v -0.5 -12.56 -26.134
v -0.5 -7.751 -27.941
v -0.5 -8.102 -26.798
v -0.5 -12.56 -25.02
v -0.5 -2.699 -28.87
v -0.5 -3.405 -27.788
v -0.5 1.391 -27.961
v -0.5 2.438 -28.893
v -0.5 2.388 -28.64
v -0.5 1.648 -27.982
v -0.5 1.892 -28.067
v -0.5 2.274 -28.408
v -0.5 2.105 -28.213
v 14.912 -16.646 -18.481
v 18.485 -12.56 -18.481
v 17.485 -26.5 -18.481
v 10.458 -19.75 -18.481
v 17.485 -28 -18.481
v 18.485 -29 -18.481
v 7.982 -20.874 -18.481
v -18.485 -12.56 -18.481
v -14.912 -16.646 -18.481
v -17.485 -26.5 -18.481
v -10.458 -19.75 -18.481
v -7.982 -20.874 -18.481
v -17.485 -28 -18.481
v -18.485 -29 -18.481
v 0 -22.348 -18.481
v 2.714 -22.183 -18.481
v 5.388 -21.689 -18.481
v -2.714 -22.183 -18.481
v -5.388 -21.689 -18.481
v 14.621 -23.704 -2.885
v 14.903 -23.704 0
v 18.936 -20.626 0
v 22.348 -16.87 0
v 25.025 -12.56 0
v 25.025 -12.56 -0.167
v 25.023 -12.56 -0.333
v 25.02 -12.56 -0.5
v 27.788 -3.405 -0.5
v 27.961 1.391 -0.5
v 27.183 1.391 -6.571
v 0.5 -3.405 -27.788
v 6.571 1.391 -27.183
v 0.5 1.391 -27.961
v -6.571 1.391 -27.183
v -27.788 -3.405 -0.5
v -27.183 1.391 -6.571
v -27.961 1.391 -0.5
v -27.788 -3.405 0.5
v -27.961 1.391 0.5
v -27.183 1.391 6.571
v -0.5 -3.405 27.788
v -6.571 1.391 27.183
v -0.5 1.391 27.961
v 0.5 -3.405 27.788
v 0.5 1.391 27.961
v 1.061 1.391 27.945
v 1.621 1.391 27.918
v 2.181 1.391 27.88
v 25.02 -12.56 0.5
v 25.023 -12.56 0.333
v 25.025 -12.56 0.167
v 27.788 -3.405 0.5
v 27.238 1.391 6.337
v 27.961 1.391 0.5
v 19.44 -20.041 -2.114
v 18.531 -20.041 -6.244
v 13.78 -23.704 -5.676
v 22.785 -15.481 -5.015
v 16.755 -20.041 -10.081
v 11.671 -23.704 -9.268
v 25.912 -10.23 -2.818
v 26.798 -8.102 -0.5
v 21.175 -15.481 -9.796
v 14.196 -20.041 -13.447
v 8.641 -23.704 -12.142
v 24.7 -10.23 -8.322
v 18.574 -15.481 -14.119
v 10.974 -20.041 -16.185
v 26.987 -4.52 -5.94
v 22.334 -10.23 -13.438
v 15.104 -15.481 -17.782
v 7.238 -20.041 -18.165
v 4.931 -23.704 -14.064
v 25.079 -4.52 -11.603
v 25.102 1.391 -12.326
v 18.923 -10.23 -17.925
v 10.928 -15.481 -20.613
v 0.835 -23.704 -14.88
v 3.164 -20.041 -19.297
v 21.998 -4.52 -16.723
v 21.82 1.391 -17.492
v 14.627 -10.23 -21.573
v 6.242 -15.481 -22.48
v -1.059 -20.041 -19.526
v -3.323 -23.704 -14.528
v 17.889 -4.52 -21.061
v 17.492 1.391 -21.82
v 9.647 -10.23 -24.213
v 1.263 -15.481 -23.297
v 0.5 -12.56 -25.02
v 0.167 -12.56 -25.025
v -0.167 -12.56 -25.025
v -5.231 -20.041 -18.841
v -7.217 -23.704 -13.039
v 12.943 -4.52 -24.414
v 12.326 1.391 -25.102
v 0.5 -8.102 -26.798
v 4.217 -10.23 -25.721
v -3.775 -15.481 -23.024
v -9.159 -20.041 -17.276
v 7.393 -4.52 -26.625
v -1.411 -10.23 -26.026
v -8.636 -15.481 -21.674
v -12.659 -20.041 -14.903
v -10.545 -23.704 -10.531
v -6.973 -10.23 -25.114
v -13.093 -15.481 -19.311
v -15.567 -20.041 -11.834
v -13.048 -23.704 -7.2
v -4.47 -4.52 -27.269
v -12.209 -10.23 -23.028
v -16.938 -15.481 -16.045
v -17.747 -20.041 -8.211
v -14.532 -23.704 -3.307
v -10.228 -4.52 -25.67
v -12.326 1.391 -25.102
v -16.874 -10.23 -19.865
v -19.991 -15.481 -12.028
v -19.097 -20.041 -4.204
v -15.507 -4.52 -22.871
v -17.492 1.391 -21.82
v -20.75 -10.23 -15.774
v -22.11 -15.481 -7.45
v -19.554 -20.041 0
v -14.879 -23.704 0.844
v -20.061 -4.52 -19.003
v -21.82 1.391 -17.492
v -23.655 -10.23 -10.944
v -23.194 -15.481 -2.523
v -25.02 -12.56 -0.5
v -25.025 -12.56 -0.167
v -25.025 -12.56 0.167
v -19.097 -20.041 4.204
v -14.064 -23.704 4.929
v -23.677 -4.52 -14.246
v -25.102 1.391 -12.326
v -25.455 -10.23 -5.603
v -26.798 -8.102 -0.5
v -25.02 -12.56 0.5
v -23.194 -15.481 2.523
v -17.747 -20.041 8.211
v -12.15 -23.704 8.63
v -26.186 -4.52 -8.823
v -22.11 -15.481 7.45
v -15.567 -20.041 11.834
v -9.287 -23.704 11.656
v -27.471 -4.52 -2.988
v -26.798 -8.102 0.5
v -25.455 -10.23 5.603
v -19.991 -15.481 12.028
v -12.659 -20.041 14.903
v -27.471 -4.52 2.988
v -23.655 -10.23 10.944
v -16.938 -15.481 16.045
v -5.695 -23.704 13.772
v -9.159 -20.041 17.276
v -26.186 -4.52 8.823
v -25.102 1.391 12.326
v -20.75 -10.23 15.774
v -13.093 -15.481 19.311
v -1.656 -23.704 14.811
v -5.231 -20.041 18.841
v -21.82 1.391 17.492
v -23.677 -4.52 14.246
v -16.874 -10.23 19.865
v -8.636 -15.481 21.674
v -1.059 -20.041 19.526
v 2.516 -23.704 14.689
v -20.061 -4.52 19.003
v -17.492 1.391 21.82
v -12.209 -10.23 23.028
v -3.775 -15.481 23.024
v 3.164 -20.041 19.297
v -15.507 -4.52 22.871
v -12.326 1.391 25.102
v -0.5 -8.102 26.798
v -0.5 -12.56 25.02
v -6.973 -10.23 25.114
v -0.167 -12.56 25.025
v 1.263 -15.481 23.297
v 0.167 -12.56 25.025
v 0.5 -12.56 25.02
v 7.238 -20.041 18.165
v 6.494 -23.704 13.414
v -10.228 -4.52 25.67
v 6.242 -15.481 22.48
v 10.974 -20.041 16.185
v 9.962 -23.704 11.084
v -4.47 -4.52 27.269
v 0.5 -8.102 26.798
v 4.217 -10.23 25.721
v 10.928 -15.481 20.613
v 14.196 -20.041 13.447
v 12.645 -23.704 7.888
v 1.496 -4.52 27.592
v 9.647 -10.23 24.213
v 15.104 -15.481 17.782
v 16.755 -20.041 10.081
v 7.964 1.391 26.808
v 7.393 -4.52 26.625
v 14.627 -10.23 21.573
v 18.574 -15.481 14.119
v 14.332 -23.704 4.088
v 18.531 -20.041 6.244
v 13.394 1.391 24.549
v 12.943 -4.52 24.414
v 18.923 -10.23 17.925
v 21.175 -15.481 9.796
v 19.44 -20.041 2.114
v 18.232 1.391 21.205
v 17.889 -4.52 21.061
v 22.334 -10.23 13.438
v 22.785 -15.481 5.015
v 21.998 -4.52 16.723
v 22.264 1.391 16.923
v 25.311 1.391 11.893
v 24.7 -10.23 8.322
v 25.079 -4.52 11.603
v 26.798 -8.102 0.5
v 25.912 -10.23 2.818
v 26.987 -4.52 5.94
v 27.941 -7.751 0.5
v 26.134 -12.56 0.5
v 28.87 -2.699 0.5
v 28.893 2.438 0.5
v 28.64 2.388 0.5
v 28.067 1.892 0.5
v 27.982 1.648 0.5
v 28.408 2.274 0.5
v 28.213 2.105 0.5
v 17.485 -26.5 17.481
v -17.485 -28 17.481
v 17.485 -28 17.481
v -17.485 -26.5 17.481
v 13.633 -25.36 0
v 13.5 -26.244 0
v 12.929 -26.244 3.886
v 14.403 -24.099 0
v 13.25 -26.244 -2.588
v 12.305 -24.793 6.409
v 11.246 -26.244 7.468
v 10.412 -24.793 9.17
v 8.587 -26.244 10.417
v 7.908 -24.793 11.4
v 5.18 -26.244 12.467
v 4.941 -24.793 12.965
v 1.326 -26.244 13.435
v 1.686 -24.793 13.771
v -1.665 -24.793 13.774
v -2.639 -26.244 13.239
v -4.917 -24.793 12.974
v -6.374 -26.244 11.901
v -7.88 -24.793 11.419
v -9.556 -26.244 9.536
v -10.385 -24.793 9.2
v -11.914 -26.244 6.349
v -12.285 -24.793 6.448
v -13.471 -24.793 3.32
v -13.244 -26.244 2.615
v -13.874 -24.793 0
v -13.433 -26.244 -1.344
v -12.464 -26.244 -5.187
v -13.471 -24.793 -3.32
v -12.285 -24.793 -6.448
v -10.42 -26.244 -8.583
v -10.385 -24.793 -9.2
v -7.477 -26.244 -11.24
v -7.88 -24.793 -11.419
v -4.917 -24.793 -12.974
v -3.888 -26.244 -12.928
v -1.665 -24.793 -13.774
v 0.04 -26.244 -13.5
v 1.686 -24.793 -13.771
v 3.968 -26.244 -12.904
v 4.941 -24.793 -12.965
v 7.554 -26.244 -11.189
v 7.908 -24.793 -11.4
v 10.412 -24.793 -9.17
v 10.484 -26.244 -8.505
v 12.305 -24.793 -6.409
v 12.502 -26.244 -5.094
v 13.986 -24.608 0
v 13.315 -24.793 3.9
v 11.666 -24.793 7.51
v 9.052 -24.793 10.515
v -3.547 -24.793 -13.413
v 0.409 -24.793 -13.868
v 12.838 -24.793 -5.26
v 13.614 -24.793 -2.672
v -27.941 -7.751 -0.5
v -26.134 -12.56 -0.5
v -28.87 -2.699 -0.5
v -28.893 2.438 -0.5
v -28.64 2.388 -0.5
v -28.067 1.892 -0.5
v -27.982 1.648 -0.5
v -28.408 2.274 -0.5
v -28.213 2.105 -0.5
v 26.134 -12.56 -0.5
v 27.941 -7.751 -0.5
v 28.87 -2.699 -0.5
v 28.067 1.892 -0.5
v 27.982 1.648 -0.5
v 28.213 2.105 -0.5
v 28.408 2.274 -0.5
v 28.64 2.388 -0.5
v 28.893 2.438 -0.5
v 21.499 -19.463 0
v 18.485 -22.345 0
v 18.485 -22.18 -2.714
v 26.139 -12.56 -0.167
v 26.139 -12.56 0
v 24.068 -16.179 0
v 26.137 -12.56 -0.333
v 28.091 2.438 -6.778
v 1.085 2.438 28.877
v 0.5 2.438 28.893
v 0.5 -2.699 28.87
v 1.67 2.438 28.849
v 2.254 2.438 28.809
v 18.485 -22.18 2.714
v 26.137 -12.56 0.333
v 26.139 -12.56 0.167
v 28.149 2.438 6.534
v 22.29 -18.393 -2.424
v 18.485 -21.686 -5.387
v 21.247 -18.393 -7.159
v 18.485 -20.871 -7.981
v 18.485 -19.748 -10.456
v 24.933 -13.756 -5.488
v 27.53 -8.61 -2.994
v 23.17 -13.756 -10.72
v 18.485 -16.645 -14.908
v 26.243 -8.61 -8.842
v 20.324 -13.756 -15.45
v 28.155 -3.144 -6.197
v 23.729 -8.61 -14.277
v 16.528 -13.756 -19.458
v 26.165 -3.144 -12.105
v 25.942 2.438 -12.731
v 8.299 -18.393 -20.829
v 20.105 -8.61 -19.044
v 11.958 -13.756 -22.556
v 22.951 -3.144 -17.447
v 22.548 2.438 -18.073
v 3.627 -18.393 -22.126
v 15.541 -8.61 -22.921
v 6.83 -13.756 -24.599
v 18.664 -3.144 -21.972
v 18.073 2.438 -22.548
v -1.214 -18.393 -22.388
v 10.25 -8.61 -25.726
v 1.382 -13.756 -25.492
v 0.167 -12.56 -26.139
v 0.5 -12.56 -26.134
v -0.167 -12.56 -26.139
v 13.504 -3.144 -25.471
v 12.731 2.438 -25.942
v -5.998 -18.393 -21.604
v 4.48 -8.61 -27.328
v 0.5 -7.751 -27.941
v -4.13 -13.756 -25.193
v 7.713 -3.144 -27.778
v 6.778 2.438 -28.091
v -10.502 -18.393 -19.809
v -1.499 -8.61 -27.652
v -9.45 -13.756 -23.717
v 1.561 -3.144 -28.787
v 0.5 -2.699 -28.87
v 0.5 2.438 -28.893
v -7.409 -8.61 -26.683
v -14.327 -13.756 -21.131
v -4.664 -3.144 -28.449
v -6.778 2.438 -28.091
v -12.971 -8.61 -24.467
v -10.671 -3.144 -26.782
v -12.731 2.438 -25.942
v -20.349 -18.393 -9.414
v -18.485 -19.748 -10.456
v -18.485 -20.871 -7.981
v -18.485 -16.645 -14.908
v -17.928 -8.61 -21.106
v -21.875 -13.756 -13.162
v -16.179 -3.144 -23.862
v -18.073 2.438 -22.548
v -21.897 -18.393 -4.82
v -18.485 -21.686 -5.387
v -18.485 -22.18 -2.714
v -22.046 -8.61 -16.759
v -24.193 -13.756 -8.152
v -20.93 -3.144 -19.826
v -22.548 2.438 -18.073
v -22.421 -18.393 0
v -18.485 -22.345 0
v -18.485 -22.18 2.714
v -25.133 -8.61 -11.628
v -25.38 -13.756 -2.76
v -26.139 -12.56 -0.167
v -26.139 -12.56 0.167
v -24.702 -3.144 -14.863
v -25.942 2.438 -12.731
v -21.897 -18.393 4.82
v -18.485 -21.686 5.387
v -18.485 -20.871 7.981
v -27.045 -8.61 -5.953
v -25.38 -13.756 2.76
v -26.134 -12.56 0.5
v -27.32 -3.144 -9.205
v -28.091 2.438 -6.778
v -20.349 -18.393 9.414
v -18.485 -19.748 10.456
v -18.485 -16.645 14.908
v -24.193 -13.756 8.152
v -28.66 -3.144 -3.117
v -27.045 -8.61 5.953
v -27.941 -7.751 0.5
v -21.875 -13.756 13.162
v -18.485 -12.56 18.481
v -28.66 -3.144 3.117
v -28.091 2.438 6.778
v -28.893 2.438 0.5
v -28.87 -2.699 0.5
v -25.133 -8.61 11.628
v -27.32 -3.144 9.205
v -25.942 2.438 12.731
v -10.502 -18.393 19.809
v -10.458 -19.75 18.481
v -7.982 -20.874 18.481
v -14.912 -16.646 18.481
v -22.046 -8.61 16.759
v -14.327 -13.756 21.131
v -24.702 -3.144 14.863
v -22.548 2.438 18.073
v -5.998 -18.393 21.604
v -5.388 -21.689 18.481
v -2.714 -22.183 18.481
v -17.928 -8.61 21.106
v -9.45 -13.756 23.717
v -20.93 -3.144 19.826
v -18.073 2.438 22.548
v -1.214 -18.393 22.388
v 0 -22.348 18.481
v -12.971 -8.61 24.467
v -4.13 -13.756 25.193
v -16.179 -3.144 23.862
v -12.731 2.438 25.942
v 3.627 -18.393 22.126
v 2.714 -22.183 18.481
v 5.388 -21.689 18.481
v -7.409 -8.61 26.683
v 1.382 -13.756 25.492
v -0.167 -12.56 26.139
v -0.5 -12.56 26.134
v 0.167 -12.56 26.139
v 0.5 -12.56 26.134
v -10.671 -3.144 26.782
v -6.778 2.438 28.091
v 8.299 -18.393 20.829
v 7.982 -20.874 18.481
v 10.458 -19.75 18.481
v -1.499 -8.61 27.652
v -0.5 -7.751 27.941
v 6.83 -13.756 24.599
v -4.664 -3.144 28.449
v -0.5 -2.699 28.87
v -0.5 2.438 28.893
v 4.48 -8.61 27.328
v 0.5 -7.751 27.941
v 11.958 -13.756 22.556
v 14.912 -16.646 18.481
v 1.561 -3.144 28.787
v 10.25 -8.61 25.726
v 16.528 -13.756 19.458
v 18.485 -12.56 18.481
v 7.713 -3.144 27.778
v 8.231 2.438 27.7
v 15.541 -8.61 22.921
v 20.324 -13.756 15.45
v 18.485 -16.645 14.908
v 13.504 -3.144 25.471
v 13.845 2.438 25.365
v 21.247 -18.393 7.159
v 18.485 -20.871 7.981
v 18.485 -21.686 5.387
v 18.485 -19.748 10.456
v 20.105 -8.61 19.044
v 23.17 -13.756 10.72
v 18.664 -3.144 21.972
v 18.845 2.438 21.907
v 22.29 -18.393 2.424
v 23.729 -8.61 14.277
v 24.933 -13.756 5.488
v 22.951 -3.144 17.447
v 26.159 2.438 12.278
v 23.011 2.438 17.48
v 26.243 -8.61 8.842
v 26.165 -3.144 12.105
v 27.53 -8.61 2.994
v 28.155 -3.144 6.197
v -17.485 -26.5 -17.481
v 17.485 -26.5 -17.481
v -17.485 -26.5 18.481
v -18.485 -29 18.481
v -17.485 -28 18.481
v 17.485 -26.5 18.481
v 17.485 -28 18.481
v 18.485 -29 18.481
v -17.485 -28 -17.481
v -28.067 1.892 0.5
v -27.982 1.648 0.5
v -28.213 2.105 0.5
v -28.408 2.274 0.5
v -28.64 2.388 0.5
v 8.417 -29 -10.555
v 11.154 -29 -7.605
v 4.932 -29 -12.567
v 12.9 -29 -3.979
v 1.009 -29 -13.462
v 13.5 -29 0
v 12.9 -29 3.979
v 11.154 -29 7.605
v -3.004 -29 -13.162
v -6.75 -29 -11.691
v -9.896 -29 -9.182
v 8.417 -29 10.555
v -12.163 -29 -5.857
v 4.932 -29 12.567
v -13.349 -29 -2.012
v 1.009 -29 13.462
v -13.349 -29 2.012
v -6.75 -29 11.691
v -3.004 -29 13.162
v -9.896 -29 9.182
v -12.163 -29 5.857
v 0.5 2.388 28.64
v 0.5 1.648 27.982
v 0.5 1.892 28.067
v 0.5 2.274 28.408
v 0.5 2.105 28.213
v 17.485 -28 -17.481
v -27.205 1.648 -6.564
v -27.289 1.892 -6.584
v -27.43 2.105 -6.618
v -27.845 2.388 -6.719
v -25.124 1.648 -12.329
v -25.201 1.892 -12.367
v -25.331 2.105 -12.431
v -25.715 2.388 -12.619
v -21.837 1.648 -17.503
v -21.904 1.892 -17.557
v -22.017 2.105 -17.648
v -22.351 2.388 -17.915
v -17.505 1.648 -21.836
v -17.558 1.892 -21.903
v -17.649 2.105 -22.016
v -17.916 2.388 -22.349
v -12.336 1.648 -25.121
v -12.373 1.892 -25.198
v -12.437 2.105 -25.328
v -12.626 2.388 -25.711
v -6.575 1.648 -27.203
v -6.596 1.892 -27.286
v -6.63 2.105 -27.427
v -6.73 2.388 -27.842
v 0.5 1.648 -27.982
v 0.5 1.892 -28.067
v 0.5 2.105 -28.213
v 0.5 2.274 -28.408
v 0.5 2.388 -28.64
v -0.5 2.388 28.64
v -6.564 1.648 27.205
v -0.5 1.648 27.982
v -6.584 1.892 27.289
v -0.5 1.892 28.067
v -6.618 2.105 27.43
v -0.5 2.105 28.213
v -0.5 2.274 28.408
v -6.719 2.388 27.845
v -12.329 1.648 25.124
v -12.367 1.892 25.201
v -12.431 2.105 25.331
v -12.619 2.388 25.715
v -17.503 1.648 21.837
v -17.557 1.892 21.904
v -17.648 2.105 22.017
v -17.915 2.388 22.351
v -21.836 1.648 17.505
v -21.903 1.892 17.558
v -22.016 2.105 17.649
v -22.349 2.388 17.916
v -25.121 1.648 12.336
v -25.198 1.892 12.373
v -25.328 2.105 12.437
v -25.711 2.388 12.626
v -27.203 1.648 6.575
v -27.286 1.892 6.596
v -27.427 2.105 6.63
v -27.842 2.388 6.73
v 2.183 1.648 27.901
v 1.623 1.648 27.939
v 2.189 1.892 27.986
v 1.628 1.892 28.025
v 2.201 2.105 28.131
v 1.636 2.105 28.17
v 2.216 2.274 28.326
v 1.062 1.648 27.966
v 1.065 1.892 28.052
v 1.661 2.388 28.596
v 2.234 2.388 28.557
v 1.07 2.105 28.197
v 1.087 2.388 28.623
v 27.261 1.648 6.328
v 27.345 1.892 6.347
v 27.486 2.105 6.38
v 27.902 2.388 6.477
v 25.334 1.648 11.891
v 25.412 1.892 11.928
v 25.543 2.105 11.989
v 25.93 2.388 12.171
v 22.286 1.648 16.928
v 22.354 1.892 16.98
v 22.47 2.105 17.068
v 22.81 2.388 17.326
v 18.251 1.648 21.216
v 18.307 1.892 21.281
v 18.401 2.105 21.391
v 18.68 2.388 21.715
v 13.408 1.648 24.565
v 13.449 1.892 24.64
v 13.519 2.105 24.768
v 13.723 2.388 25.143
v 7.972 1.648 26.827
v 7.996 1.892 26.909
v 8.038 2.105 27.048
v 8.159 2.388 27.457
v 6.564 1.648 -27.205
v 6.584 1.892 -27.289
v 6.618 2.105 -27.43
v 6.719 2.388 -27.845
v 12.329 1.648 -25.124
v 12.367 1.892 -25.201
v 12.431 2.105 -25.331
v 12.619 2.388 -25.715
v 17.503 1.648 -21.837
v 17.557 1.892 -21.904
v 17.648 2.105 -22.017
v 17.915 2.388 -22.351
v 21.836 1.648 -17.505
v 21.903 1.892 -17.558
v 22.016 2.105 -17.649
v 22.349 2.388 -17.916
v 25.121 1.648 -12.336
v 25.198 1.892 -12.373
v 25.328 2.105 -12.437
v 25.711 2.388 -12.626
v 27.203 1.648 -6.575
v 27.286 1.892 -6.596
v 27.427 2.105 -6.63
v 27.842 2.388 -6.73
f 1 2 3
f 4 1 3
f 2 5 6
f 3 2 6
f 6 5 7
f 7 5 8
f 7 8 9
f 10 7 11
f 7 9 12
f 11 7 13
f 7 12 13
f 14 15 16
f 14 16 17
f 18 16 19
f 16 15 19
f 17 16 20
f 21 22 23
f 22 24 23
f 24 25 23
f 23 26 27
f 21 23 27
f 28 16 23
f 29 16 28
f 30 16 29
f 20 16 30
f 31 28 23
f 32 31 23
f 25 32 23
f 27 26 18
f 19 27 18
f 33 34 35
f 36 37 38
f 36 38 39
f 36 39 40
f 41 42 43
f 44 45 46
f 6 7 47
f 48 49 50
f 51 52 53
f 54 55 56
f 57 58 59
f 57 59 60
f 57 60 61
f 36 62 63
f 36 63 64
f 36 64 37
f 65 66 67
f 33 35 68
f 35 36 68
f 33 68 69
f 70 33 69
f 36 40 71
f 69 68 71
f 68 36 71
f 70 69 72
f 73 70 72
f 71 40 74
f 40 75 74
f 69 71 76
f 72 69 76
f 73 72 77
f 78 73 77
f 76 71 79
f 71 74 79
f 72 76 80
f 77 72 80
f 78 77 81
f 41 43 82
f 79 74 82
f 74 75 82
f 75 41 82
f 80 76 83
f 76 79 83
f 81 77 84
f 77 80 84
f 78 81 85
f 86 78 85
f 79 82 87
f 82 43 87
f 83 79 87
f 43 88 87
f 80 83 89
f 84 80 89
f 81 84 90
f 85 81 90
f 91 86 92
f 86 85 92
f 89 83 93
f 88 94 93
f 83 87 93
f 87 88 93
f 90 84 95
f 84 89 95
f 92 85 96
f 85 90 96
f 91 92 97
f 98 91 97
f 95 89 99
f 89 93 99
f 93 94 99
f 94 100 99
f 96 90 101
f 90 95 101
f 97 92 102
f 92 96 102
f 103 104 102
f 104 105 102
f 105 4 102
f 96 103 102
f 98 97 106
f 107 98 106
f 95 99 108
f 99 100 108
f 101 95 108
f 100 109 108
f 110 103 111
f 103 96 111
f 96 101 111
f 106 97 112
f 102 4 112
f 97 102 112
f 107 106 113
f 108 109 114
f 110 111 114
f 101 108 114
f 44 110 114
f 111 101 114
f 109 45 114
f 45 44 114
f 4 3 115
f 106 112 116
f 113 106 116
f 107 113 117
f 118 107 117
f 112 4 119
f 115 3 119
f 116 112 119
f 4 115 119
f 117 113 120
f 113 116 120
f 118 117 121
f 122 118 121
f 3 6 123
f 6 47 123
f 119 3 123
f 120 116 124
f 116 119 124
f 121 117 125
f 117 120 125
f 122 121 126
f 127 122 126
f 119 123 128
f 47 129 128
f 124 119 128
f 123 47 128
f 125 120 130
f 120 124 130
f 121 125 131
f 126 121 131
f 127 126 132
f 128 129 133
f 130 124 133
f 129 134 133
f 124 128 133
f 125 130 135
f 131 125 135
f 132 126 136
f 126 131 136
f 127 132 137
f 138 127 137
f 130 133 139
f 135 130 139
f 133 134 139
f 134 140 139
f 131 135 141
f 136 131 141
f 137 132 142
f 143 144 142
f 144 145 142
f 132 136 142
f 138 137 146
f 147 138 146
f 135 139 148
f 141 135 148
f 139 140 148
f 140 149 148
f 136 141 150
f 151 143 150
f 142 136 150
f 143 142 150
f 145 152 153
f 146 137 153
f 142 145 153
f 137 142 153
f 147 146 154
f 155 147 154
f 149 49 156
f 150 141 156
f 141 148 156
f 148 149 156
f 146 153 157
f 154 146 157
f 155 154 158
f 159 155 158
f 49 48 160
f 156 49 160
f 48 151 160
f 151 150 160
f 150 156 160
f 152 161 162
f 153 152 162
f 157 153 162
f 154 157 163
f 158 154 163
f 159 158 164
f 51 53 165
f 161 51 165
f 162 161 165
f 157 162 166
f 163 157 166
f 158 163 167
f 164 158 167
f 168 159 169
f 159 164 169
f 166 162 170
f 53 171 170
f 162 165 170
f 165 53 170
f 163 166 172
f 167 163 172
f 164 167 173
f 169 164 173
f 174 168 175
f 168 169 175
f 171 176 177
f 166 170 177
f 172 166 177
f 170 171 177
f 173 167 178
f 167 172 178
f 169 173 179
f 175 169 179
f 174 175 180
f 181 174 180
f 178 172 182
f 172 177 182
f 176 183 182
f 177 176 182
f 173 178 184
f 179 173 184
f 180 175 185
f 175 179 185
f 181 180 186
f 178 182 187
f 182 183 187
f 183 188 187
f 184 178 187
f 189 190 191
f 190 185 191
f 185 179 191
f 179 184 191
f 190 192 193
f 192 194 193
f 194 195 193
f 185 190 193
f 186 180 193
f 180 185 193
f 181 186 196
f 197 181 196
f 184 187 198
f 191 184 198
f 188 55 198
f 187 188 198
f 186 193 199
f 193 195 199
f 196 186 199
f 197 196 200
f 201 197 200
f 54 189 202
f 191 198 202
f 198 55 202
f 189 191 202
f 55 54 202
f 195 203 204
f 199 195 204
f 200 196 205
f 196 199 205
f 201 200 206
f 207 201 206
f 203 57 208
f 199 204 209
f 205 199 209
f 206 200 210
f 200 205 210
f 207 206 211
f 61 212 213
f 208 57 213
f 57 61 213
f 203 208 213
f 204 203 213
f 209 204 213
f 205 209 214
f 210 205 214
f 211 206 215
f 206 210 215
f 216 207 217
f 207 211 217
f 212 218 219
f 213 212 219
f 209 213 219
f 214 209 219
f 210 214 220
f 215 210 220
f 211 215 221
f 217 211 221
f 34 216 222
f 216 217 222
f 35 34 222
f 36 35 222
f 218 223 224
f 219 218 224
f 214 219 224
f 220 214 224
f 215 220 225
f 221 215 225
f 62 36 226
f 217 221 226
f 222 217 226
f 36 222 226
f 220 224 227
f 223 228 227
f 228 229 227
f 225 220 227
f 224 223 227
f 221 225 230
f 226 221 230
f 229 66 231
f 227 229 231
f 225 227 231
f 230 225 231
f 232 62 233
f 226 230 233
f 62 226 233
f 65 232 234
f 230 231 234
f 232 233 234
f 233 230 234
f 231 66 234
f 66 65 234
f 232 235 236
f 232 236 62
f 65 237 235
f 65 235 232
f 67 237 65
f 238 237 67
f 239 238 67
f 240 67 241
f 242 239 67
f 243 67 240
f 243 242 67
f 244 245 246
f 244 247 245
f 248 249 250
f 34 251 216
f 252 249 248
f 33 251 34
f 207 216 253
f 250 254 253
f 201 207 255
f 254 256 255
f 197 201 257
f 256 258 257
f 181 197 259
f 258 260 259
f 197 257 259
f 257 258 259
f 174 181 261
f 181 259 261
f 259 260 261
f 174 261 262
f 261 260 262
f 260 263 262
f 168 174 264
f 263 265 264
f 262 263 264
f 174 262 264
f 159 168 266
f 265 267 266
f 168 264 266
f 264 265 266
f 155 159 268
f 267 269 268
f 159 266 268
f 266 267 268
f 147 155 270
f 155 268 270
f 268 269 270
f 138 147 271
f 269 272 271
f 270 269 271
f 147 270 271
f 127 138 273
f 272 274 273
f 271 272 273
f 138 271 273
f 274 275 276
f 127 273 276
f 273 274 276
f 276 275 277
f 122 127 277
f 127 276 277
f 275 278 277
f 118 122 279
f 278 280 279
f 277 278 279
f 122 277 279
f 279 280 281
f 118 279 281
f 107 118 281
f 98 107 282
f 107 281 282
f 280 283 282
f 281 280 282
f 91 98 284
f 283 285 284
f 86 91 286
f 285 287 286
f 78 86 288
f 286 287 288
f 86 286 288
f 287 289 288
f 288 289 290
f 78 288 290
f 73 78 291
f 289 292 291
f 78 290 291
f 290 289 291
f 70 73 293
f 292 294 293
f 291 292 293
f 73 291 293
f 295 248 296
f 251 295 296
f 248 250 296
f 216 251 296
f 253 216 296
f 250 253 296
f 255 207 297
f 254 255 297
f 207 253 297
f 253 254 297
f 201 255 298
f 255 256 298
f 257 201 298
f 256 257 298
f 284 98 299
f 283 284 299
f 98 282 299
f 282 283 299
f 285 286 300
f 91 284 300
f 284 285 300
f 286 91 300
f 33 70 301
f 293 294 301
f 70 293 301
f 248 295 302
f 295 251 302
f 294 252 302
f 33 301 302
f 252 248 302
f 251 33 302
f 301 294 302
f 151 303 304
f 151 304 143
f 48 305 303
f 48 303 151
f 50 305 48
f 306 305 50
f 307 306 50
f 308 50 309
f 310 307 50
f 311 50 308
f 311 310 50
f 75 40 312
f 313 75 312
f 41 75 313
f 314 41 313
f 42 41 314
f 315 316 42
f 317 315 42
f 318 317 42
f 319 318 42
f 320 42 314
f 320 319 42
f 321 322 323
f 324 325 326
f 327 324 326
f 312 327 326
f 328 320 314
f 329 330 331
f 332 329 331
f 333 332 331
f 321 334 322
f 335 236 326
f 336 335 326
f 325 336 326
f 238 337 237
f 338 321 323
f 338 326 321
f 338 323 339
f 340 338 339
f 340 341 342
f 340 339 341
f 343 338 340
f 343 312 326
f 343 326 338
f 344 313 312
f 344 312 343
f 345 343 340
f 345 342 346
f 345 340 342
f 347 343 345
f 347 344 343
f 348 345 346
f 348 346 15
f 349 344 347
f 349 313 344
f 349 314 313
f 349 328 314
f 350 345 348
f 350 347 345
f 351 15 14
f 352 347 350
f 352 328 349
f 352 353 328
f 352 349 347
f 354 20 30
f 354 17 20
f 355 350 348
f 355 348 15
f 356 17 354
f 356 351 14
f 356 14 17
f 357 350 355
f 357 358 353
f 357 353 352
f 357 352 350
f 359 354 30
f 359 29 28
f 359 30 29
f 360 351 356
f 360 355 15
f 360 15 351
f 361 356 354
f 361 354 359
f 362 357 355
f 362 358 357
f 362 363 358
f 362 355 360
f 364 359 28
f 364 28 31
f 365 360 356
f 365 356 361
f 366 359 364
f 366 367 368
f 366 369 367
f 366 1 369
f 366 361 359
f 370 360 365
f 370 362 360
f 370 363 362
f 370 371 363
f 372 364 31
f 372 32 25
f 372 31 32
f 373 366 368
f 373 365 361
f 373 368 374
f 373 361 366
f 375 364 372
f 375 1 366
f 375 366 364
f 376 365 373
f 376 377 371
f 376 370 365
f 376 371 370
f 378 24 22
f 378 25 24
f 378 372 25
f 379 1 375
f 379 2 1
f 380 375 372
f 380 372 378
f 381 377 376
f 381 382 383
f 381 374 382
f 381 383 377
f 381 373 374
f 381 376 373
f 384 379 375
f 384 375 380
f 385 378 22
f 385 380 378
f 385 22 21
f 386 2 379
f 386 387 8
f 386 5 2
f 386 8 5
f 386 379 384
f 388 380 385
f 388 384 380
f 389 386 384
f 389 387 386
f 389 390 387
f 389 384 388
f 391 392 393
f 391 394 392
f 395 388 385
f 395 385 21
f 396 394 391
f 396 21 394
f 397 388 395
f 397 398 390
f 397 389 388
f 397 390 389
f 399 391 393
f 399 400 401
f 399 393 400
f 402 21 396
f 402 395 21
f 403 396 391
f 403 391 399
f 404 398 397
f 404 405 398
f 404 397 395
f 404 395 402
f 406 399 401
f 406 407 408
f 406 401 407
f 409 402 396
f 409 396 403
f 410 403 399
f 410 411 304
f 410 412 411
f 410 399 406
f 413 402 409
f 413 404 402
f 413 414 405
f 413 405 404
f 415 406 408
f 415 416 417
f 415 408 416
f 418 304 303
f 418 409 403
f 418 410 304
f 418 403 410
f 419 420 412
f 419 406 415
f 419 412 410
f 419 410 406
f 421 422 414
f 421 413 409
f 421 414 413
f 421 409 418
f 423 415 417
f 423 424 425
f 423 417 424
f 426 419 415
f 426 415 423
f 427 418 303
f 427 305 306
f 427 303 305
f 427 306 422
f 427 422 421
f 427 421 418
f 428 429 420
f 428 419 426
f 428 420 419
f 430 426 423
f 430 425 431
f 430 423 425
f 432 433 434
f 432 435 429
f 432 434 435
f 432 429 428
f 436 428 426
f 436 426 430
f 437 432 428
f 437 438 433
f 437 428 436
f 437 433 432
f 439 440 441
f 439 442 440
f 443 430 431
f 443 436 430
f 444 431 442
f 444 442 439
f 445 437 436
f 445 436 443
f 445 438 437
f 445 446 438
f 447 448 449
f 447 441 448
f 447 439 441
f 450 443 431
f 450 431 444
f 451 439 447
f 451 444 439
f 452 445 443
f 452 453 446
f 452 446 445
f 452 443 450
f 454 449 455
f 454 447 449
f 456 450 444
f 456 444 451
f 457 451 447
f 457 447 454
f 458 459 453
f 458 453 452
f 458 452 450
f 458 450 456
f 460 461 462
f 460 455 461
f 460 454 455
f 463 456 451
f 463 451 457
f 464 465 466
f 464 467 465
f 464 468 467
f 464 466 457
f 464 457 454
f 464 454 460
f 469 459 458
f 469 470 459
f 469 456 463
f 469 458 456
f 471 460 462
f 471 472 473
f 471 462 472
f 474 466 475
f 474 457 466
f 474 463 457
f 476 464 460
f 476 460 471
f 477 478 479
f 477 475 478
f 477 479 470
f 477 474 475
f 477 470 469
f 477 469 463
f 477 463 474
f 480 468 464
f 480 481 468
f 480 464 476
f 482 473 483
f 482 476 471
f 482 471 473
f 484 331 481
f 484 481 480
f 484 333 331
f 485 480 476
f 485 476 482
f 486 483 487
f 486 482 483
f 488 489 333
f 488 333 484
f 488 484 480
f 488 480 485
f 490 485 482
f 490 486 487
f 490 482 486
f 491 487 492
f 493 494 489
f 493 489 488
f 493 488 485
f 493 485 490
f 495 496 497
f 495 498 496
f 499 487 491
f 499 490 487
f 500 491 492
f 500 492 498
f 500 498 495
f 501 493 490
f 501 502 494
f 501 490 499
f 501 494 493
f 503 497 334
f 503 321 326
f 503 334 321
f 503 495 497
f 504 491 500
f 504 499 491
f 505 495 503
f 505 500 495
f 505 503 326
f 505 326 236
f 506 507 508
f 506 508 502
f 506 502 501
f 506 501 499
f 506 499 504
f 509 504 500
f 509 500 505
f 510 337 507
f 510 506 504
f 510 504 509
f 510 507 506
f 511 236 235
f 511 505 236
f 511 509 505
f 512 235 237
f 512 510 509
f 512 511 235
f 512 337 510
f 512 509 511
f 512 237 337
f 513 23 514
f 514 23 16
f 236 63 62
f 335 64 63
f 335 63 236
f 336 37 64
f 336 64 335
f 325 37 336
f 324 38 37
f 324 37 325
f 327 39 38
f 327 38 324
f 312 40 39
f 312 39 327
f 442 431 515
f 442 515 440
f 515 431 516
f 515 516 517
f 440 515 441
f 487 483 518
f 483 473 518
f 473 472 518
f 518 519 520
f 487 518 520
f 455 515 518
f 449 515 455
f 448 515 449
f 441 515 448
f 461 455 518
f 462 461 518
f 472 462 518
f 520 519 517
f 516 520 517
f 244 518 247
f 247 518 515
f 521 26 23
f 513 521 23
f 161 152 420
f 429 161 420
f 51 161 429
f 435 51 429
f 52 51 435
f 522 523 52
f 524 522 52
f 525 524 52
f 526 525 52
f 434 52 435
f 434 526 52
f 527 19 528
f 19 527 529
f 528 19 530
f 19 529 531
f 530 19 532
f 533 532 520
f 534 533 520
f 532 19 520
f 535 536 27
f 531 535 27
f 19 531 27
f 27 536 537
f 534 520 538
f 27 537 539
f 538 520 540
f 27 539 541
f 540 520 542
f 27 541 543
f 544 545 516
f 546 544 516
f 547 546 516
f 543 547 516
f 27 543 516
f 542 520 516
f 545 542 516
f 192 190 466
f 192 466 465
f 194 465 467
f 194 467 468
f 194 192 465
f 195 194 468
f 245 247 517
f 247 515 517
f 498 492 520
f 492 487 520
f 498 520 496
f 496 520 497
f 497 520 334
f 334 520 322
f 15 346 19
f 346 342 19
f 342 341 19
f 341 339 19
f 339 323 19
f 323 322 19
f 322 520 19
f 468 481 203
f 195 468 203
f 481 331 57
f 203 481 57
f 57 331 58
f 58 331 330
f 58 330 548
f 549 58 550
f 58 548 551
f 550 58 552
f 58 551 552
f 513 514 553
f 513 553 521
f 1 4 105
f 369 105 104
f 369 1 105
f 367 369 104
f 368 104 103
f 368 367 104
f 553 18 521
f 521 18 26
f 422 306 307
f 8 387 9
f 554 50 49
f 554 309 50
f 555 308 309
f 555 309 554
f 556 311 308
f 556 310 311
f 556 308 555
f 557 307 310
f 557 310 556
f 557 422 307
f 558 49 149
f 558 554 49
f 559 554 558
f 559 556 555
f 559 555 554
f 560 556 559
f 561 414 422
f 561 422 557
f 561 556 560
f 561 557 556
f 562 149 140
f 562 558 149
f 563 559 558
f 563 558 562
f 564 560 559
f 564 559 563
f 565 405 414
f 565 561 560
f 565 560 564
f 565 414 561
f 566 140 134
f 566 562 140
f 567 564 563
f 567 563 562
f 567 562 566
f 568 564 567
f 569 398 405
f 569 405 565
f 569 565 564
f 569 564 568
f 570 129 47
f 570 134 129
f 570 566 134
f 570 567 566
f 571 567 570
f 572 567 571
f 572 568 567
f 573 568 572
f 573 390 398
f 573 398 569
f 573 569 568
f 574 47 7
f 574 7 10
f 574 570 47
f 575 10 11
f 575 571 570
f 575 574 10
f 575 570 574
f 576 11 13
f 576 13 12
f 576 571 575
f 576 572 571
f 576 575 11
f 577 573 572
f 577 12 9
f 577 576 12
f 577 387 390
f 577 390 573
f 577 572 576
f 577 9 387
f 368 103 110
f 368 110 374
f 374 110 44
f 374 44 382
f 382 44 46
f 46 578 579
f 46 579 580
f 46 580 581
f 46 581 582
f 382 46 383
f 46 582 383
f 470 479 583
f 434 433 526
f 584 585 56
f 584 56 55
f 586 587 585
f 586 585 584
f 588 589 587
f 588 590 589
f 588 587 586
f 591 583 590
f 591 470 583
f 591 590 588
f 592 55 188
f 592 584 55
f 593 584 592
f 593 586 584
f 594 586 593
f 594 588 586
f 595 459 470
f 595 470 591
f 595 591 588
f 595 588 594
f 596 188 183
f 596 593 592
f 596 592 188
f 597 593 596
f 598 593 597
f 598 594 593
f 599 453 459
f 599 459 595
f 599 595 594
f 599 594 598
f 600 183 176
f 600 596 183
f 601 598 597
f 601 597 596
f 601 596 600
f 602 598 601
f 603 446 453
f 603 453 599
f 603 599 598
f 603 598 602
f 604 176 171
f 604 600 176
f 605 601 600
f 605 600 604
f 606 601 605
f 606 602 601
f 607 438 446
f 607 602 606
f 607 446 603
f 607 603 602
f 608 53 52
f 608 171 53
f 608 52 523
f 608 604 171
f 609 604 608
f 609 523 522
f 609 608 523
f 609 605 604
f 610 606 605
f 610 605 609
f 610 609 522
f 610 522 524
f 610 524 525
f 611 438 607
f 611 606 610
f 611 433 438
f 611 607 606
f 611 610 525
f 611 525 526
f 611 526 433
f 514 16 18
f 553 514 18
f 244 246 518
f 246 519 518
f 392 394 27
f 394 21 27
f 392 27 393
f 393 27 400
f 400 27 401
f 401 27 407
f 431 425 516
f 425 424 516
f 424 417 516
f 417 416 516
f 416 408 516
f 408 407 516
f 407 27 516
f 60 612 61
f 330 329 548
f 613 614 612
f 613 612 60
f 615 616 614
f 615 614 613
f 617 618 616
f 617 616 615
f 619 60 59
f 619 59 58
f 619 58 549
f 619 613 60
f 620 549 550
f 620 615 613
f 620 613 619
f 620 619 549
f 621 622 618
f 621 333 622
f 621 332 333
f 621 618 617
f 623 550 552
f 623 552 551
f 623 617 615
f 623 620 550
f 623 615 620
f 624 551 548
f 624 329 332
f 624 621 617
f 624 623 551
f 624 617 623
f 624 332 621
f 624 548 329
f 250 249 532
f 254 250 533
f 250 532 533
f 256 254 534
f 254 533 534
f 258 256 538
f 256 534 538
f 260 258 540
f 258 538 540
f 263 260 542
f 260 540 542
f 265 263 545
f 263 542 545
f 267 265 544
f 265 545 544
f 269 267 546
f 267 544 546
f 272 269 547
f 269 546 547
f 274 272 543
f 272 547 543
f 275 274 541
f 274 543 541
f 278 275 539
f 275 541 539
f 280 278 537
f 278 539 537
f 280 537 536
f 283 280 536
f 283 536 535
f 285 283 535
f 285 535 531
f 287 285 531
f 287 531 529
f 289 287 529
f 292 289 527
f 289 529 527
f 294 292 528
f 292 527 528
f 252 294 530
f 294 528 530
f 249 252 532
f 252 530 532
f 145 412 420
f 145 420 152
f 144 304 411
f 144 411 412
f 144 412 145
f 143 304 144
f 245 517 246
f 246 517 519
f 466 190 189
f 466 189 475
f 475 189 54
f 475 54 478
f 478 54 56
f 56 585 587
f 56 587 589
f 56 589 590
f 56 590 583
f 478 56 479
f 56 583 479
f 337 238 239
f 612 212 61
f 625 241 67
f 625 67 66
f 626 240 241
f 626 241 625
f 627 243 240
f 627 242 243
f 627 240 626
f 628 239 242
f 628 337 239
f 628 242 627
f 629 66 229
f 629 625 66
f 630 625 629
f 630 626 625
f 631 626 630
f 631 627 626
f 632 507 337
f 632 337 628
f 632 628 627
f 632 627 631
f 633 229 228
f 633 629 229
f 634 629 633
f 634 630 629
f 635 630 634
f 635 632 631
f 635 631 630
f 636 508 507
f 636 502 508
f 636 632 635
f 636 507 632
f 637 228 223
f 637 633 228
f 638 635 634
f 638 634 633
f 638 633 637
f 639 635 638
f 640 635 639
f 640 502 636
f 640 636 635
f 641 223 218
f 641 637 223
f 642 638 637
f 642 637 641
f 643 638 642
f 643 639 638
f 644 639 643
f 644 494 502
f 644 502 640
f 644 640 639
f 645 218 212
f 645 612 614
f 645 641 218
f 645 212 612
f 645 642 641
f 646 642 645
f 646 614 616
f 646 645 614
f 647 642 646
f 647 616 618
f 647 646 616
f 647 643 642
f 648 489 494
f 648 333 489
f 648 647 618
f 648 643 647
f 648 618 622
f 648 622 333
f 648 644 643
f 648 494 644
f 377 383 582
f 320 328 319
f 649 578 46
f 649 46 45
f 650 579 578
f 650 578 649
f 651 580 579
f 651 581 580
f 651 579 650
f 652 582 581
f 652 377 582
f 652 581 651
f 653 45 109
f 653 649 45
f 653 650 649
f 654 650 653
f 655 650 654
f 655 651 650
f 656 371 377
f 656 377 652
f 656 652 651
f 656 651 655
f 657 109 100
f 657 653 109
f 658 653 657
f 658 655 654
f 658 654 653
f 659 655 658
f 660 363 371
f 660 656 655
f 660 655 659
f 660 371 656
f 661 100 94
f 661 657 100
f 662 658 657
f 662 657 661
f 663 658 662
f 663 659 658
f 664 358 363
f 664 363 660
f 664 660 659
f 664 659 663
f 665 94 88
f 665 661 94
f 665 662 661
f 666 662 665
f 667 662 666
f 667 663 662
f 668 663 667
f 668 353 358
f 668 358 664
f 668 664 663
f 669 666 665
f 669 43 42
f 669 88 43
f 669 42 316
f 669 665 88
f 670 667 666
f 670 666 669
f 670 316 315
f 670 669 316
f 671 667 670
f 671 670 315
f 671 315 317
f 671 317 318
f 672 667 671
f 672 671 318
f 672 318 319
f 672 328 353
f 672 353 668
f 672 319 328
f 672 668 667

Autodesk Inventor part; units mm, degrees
ref_plane "YZ Plane" through (0, 0, 0) normal (1, 0, 0) x (0, 1, 0)
sketch "Sketch1" plane through (0, 0, 0) normal (0, 0, 1) x (1, 0, 0)
  circle A0 centre (0, 0) radius 28 construction
  circle A1 centre (0, 0) radius 29 construction
  circle A2 centre (0, 0) radius 28
  circle A3 centre (0, 0) radius 29
  line L0 (0, 0) -> (27.8935, 2.4404)
  line L1 (0, 0) -> (28, 0) construction
  line L2 (0, 0) -> (0, -29.5121)
  line L3 (0, -28) -> (0, -29)
  line L4 (27.8935, 2.4404) -> (28.8971, 2.4404)
  dimension "d0" = 56
  dimension "d1" = 58
  dimension "d2" = 5
revolve "Revolution1" add sketch "Sketch1" angle 360 about axis through (0, 0, 0) along (0, -1, 0) picked at (16.0405, -23.5642) contours A2 L4 A3 L2
sketch "Sketch2" plane through (0, 2.4404, 0) normal (0, 1, 0) x (1, 0, 0)
  line L0 (-0.5, -30) -> (0.5, -30)
  line L1 (0.5, -30) -> (0.5, 30)
  line L2 (0.5, 30) -> (-0.5, 30)
  line L3 (-0.5, 30) -> (-0.5, -30)
  line L4 (-0.5, -30) -> (0.5, 30) construction
  line L5 (0.5, -30) -> (-0.5, 30) construction
  line L6 (30, -0.5) -> (-30, -0.5)
  line L7 (-30, -0.5) -> (-30, 0.5)
  line L8 (-30, 0.5) -> (30, 0.5)
  line L9 (30, 0.5) -> (30, -0.5)
  circle A0 centre (0, 0) radius 28.8971 projected
  line L10 (30, -0.5) -> (-30, 0.5) construction
  line L11 (-30, -0.5) -> (30, 0.5) construction
  point P0 (0.5, 0.5)
  point P1 (-0.5, 0.5)
  point P2 (-0.5, -0.5)
  point P3 (0.5, -0.5)
  dimension "d4" = 1
  dimension "d5" = 60
  dimension "d6" = 60
  dimension "d7" = 1
extrude "Extrusion1" cut sketch "Sketch2" against normal blind 15 contours L3 A0 L1 L0 | L3 L6 L1 A0 | L6 A0 L8 L3 | L3 L8 L1 L6 | L6 L7 L8 A0 | L1 L8 A0 L6 | A0 L8 L9 L6 | L3 A0 L1 L8 | L3 L2 L1 A0
ref_plane "Work Plane1" through (0, -29, 0) normal (0, 1, 0) x (-1, 0, 0)
sketch "Sketch3" plane through (0, -29, 0) normal (0, 1, 0) x (-1, 0, 0)
  arc A0 (-0.5, 28.8928) -> (-28.8928, 0.5) centre (0, 0) ccw projected
  arc A1 (-0.5, -26.1344) -> (0.5, -26.1344) centre (0, 0) ccw projected
  line L0 (0.5, -25.0201) -> (0.5, -26.1344) projected
  arc A2 (-0.5, -25.0201) -> (0.5, -25.0201) centre (0, 0) ccw projected
  line L1 (-0.5, -26.1344) -> (-0.5, -25.0201) projected
  circle A3 centre (0, 0) radius 26.1392
  line L2 (18.485, 18.4813) -> (-18.485, 18.4813)
  line L3 (-18.485, 18.4813) -> (-18.485, -18.4813)
  line L4 (-18.485, -18.4813) -> (18.485, -18.4813)
  line L5 (18.485, -18.4813) -> (18.485, 18.4813)
  line L6 (18.485, 18.4813) -> (-18.485, -18.4813) construction
  line L7 (-18.485, 18.4813) -> (18.485, -18.4813) construction
  dimension "d11" = 36.97
extrude "Extrusion2" add sketch "Sketch3" along normal up to surface contours L3 L2 L5 L4
sketch "Sketch4" plane through (0, -29, 0) normal (0, -1, 0) x (1, 0, 0)
  circle A0 centre (0, 0) radius 13.5
  dimension "d14" = 27
extrude "Extrusion3" cut sketch "Sketch4" against normal blind 10
fillet "Fillet1" radius 3 1 edges at (-13.5, -24.5306, 0)
fillet "Fillet2" radius 1 4 edges at (-19.7236, 2.4404, 19.7236) (-19.7236, 2.4404, -19.7236) (19.7236, 2.4404, -19.7236) (19.7236, 2.4404, 19.7236)
sketch "Sketch5" plane through (-18.485, -29, 18.4813) normal (0, 0, 1) x (1, 0, 0)
  line L0 (0, 0) -> (0, 16.4404) construction
  line L1 (0, 0) -> (1, 0) construction
  line L2 (1, 0) -> (1, 1) construction
  line L3 (1, 1) -> (0, 1) construction
  line L4 (0, 1) -> (0, 0) construction
  arc A0 (0, 16.4404) -> (36.97, 16.4404) centre (18.485, 29) ccw construction
  line L5 (0, 0) -> (0, 16.4404) construction
  line L6 (0, 0) -> (36.97, 0) construction
  line L7 (36.97, 0) -> (36.97, 16.4404) construction
  line L8 (1, 1) -> (35.97, 1) construction
  line L9 (35.97, 1) -> (35.97, 2.5) construction
  line L10 (35.97, 2.5) -> (1, 2.5) construction
  line L11 (1, 2.5) -> (1, 1) construction
  line L12 (1, 1) -> (35.97, 1)
  line L13 (35.97, 1) -> (35.97, 2.5)
  line L14 (35.97, 2.5) -> (1, 2.5)
  line L15 (1, 2.5) -> (1, 1)
  dimension "d19" = 1
  dimension "d20" = 1
  dimension "d21" = 34.97
  dimension "d22" = 1.5
extrude "Extrusion4" cut sketch "Sketch5" against normal blind 1
ref_plane "Work Plane2" through (-18.485, -29, 0) normal (0, 0, 1) x (1, 0, 0)
mirror "Mirror1" about plane through (-18.485, -29, 0) normal (0, 0, 1) of "Extrusion4"
properties part number "Socket"
